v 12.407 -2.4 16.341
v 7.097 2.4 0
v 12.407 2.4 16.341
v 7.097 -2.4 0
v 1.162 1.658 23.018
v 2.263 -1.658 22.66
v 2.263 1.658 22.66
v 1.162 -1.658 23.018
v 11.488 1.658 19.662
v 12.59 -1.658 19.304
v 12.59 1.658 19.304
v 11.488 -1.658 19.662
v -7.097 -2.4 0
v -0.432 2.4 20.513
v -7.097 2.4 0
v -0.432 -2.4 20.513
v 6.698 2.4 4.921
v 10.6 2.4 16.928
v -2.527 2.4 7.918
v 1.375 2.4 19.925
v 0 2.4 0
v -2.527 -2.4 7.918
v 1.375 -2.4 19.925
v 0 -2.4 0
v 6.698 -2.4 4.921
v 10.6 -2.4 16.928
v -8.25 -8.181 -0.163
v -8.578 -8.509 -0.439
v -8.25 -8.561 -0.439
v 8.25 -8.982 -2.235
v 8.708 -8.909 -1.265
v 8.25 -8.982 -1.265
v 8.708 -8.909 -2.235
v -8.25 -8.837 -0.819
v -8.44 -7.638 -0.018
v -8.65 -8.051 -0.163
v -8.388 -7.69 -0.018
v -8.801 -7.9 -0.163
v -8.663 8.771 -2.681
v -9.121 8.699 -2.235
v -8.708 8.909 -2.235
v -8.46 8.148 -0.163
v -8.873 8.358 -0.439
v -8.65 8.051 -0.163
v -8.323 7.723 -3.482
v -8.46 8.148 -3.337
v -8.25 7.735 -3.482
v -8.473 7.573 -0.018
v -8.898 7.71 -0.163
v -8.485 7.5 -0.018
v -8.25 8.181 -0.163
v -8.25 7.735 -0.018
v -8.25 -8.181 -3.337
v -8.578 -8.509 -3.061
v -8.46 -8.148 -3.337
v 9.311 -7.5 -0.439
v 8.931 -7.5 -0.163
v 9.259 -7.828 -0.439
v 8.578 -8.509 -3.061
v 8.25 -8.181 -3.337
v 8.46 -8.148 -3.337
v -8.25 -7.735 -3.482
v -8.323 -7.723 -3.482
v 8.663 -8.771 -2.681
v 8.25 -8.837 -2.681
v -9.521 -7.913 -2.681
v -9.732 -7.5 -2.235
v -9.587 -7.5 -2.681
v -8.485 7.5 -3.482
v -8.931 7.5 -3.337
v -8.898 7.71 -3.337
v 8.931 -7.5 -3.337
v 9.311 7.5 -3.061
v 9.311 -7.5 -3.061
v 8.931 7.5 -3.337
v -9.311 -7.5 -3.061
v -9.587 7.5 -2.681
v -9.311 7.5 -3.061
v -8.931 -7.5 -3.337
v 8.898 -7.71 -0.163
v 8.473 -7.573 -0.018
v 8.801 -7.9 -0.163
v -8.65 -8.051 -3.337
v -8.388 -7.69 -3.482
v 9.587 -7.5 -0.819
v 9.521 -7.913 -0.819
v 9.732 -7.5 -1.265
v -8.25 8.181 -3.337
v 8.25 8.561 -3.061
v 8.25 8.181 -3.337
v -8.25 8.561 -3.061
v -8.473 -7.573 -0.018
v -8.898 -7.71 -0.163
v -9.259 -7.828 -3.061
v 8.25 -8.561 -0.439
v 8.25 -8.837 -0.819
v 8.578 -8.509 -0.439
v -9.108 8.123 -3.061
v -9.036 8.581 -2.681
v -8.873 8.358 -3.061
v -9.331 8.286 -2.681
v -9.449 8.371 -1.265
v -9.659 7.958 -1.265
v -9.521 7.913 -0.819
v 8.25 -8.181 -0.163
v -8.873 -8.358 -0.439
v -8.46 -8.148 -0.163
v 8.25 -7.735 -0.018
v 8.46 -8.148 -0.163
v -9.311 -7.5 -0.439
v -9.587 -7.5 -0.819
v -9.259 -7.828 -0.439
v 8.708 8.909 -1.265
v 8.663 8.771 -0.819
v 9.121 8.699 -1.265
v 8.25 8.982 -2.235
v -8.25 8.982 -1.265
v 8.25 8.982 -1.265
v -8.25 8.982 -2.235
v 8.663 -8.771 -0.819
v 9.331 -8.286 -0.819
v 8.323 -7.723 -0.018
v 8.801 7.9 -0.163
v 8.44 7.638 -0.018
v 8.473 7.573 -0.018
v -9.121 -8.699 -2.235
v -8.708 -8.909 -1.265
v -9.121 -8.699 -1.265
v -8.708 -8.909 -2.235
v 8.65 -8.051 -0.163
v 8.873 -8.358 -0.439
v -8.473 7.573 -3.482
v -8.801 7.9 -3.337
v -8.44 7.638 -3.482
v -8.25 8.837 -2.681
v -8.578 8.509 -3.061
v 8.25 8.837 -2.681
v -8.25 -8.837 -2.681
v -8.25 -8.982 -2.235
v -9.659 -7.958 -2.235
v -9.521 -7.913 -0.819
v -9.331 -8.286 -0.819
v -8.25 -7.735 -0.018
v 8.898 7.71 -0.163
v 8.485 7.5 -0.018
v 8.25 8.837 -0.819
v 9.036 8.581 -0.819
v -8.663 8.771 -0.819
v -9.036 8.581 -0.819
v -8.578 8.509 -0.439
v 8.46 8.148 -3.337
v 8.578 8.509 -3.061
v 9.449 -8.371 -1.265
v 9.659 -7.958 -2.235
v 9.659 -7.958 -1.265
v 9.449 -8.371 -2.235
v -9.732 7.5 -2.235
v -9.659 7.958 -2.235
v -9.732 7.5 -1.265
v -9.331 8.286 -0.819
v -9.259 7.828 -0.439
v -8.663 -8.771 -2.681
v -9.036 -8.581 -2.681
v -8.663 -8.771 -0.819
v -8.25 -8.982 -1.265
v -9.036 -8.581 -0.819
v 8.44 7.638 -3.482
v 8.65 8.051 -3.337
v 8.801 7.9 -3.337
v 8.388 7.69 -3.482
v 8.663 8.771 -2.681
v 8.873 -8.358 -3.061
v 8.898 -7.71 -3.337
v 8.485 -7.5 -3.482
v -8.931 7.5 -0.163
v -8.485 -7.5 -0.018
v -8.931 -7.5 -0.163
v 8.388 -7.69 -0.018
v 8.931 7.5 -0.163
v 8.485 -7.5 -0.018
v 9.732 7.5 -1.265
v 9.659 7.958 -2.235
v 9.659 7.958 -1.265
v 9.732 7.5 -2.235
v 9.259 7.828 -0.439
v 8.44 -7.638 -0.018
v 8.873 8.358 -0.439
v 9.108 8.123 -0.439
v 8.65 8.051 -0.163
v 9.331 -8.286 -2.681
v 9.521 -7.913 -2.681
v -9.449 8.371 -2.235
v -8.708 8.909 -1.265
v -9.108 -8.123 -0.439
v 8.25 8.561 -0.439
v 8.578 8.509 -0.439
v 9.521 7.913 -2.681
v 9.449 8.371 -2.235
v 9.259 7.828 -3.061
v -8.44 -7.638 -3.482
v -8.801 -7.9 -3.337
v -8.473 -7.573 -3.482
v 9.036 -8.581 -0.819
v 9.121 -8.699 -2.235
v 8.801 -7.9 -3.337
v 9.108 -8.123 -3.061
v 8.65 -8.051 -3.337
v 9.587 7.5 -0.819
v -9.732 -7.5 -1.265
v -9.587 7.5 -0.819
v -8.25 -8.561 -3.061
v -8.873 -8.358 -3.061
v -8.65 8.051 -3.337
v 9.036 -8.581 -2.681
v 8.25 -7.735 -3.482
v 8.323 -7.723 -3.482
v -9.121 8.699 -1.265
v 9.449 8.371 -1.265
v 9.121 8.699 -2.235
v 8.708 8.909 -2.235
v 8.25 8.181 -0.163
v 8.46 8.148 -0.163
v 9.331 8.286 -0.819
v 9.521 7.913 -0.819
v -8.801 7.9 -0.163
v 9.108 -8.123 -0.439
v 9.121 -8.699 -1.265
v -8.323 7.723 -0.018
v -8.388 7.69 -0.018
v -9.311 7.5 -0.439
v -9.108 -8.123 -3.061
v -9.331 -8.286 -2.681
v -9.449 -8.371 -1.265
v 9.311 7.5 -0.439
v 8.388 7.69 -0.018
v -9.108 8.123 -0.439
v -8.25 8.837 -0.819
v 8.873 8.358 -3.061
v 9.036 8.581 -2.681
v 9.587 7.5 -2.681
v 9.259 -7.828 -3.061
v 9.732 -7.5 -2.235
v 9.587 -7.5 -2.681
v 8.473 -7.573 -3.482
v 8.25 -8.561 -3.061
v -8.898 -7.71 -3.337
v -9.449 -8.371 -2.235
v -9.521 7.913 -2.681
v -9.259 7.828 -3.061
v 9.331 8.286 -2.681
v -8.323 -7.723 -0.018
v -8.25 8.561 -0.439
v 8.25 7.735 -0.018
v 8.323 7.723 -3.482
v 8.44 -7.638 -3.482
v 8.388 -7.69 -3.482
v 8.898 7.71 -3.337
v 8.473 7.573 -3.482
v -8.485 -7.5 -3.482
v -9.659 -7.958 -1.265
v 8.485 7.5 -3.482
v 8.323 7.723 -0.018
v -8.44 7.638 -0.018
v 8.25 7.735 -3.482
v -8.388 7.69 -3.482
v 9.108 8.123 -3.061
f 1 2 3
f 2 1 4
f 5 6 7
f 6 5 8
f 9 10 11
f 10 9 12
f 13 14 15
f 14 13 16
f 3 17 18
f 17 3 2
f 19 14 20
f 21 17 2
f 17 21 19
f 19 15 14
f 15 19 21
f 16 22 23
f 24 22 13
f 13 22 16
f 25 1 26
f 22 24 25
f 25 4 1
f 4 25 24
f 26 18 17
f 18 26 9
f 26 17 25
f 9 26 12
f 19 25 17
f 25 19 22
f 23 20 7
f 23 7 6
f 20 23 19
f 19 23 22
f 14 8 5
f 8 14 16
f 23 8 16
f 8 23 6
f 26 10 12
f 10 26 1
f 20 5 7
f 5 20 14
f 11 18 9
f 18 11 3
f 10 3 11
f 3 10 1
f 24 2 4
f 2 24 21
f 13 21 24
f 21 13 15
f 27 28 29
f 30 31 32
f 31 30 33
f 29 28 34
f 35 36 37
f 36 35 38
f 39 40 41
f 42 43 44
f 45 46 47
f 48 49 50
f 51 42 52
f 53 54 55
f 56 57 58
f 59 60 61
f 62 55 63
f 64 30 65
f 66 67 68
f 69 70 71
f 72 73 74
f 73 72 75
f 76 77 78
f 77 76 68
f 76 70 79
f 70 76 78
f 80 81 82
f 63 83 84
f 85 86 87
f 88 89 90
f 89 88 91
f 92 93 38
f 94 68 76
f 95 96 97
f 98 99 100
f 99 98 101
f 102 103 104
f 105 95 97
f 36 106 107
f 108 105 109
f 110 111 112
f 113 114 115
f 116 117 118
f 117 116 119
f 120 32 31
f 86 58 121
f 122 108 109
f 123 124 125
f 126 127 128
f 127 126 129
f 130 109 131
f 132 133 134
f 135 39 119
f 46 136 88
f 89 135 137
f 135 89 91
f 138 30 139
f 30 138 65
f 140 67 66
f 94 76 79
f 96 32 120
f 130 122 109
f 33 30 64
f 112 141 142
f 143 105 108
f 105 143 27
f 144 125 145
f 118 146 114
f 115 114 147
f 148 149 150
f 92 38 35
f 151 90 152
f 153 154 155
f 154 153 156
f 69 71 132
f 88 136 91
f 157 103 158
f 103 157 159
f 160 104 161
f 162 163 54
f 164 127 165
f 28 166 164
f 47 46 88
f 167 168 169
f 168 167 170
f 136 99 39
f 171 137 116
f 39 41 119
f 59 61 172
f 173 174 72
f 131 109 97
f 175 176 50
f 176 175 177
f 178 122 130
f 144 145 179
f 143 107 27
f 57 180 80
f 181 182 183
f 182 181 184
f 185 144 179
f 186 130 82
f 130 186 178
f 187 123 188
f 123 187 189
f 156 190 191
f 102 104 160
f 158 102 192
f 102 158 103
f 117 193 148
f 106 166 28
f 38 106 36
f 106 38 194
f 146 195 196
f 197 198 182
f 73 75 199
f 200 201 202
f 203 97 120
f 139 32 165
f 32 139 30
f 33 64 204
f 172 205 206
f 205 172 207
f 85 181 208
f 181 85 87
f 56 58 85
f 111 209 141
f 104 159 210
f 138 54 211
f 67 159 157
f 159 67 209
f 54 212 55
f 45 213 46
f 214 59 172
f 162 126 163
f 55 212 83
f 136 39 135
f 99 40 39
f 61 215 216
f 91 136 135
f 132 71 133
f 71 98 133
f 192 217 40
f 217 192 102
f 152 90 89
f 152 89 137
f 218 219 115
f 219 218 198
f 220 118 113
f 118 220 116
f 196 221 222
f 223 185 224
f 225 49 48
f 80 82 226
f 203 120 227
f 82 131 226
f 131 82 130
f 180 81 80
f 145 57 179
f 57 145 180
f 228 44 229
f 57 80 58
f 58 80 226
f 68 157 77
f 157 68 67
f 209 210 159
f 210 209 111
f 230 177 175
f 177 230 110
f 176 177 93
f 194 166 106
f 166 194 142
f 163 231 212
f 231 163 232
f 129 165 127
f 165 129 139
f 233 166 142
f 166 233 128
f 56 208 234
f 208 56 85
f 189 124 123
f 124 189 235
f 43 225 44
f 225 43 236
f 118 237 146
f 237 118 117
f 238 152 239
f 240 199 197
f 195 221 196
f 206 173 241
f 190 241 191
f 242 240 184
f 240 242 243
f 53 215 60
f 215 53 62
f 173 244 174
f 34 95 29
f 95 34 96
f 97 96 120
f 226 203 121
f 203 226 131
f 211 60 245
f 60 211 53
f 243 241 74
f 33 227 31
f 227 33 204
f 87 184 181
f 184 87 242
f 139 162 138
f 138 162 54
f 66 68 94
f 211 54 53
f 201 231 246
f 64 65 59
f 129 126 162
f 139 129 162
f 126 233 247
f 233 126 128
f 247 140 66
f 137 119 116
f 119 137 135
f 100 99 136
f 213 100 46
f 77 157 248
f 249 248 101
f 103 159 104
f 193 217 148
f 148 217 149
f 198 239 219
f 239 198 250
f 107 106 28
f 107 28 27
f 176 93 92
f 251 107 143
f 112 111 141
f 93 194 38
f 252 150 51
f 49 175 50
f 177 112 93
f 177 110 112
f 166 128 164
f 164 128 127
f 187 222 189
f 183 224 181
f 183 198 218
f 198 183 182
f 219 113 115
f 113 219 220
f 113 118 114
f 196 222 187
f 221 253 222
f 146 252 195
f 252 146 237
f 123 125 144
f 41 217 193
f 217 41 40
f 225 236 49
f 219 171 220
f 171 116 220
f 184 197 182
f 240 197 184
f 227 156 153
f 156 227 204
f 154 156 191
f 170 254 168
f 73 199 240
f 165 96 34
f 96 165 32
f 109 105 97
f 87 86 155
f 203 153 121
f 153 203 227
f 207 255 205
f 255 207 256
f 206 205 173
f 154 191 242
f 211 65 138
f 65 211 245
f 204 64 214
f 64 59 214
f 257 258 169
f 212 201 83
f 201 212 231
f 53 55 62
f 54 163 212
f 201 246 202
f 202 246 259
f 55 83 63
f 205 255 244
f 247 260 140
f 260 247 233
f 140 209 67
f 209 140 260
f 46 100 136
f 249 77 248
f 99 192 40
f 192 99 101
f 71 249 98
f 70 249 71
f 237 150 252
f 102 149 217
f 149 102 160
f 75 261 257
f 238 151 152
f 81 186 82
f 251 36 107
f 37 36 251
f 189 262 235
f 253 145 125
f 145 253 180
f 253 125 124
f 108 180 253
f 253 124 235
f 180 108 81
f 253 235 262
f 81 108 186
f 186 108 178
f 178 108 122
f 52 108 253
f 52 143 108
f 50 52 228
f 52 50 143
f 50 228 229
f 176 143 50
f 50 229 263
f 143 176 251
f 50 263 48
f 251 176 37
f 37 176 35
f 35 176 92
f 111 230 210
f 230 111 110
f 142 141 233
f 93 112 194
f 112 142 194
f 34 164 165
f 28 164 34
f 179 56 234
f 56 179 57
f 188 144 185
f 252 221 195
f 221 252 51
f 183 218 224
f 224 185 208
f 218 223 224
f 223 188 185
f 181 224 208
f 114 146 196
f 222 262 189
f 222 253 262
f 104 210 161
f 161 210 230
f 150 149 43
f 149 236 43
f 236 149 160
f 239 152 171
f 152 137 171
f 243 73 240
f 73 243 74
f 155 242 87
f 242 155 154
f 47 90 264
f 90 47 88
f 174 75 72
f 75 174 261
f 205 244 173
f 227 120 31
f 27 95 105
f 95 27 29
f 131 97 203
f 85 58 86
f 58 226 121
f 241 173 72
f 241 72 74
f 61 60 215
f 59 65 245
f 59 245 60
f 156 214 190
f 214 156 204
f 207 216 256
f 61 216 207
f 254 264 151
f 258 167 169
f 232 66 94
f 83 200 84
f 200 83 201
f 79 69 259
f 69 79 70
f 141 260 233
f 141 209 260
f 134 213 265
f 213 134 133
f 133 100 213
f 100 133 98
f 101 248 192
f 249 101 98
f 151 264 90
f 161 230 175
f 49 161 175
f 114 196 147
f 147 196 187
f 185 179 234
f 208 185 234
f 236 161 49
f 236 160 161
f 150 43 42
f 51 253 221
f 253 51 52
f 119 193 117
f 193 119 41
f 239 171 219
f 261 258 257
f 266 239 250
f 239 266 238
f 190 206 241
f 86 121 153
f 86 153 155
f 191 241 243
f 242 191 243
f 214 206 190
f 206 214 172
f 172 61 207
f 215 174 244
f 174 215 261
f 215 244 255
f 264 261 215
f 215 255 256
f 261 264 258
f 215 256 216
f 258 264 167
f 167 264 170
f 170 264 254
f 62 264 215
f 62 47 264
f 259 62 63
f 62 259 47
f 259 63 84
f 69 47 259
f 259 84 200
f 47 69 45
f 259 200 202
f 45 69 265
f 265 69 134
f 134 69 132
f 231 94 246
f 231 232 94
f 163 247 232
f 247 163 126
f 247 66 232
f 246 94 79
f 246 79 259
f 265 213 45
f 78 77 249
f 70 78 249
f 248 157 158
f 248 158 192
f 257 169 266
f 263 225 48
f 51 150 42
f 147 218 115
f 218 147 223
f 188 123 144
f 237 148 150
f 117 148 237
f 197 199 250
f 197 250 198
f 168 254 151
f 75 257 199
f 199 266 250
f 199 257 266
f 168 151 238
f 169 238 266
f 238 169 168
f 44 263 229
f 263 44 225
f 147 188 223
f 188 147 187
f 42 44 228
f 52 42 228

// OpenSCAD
baseWidth = 19.5;
baseDepth = 18.0;
baseHeight = 3.5;

keyTolerance = 0.1;
keyMeanHeight = 22.25;
keyMaxHeight = 24.5;
keyDepth = 5.0 - 2 * keyTolerance;
keyWidth = 13.7 - 2 * keyTolerance;
keyAngle = 18.0;

cutoutHeight = 15.5;
cutoutWidth = (keyWidth - (2 * 2.0)) + 2 * keyTolerance;

ClarkeKey();

module ClarkeKey() {
   AngleMountedKey();
   radius = 1.5;
   translate([-baseWidth / 2 + radius, -baseDepth / 2 + radius, -baseHeight + radius]) {
      minkowski() {
         cube([baseWidth - radius * 2, baseDepth - radius * 2, baseHeight - radius * 2]);
         sphere(radius, $fn=20);
      }
   }
}

module AngleMountedKey() {
   intersection() {
      AngledKey();
      PositiveSpace();
   }
   rotate([0, 180, 0]) {
      difference() {
         AngledKey();
         PositiveSpace();
      }
   }
}

module AngledKey() {
   rotate([0, keyAngle, 0]) {
      TaperedKey();
   }
}

module TaperedKey() {
   intersection() {
      Key();
      
      hull() {
         translate([-(keyWidth + 10) / 2, -(keyDepth + 10) / 2, 0]) {
            cube([keyWidth + 10, keyDepth + 10, 0.00001]);
         }
         translate([-((keyWidth / 2) - 1), -((keyDepth / 2) - 1), keyMeanHeight + 1]) {
            cube([keyWidth - 2, keyDepth - 2, 0.00001]);
         }
      }
   }
}

module Key() {
   difference() {
      translate([-keyWidth / 2, -keyDepth / 2, 0]) {
         cube([keyWidth, keyDepth, keyMeanHeight]);
      }
      
      translate([-cutoutWidth / 2, -keyDepth / 2, keyMeanHeight - cutoutHeight]) {
         cube([cutoutWidth, keyDepth, cutoutHeight]);
      }
   }
}

module PositiveSpace() {
   big = 100;
   translate([-big / 2, -big / 2, 0]) {
      cube([big, big, big]);
   }
}
